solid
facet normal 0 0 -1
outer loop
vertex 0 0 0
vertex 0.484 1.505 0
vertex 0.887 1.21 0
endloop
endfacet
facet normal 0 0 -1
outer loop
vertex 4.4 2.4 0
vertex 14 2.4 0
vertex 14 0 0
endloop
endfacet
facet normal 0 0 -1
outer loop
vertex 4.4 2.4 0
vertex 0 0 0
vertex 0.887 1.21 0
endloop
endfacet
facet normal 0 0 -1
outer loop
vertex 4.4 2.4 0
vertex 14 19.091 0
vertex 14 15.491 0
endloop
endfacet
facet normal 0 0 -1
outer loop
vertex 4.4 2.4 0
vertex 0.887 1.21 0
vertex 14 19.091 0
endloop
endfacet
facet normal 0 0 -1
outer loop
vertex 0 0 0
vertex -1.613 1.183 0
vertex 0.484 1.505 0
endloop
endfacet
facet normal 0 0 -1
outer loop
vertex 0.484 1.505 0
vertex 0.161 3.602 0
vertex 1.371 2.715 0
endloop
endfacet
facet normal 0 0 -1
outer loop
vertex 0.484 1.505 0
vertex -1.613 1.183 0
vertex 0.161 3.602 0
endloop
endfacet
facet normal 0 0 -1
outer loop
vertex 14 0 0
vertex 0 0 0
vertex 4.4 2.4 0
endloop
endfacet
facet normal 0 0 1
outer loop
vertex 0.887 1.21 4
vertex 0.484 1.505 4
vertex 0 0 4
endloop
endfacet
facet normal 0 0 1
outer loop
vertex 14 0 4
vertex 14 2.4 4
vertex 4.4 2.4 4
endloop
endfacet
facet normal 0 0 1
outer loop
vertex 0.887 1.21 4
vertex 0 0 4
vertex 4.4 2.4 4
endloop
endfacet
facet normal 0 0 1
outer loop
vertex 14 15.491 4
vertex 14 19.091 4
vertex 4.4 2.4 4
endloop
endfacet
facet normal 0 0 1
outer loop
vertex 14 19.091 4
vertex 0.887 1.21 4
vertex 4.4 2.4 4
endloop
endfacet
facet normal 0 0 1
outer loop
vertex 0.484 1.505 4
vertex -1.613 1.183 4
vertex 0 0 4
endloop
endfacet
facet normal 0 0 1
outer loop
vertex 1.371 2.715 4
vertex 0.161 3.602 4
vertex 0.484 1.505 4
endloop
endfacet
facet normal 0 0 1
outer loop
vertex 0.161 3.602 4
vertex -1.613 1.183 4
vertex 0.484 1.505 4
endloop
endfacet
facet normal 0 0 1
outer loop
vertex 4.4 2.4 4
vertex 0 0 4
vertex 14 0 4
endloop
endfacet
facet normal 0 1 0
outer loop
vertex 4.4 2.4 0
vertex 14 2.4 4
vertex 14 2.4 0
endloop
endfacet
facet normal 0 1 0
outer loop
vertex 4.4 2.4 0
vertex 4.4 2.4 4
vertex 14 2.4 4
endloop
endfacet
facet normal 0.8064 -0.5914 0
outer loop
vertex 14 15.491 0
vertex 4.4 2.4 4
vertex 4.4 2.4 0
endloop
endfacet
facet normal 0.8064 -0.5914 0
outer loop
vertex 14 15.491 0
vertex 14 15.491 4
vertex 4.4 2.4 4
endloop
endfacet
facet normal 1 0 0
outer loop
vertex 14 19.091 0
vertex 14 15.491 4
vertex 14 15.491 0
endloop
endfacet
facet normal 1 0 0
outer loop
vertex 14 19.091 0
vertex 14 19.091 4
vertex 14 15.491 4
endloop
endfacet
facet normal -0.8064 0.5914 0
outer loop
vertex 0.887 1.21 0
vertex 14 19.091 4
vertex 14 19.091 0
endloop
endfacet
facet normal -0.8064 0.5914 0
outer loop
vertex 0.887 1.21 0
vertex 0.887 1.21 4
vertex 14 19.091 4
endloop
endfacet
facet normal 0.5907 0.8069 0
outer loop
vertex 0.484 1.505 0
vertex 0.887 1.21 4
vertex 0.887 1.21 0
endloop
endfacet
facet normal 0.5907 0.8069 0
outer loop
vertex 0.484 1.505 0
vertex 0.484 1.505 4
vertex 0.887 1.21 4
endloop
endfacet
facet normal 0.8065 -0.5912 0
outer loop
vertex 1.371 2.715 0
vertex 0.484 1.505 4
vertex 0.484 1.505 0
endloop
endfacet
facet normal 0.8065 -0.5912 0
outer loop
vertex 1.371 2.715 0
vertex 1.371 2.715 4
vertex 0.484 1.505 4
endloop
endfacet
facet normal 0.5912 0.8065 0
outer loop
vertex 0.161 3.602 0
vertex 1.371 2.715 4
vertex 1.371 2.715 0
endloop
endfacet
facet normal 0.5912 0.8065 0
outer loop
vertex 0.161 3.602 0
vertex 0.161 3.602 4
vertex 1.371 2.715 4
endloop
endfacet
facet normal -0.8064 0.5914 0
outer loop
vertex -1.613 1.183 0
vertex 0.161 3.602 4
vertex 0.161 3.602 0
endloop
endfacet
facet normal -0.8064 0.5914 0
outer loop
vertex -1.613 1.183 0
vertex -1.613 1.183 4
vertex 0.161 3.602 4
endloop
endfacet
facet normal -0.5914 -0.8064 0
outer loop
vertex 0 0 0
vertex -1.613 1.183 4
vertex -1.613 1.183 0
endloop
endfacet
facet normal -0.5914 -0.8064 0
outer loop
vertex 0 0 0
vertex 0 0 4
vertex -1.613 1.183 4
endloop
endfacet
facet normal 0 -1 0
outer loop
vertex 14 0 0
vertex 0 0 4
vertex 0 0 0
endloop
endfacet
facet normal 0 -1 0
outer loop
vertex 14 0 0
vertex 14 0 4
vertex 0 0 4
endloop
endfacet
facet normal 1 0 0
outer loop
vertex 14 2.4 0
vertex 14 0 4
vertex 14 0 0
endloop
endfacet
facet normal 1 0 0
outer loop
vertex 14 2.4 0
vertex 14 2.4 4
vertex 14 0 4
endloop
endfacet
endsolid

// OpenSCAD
module triangle(x,y) {
    polygon(points=[[0,0],[x,0],[x,y]]);
}

linear_extrude(height=4) {
    
    difference() {
        triangle(22,30);
        
        {scale([0.8, 0.8, 0.8]) translate([5.5,3,0]) { triangle(22,30);}
        translate([14,0,0]) square(40);
        }
    }
    
    rotate(atan(30/22)) difference() {
        square([3,2]);
        translate([1.5,0,0]) {square([1.5, 0.5]);} 
    }

}
